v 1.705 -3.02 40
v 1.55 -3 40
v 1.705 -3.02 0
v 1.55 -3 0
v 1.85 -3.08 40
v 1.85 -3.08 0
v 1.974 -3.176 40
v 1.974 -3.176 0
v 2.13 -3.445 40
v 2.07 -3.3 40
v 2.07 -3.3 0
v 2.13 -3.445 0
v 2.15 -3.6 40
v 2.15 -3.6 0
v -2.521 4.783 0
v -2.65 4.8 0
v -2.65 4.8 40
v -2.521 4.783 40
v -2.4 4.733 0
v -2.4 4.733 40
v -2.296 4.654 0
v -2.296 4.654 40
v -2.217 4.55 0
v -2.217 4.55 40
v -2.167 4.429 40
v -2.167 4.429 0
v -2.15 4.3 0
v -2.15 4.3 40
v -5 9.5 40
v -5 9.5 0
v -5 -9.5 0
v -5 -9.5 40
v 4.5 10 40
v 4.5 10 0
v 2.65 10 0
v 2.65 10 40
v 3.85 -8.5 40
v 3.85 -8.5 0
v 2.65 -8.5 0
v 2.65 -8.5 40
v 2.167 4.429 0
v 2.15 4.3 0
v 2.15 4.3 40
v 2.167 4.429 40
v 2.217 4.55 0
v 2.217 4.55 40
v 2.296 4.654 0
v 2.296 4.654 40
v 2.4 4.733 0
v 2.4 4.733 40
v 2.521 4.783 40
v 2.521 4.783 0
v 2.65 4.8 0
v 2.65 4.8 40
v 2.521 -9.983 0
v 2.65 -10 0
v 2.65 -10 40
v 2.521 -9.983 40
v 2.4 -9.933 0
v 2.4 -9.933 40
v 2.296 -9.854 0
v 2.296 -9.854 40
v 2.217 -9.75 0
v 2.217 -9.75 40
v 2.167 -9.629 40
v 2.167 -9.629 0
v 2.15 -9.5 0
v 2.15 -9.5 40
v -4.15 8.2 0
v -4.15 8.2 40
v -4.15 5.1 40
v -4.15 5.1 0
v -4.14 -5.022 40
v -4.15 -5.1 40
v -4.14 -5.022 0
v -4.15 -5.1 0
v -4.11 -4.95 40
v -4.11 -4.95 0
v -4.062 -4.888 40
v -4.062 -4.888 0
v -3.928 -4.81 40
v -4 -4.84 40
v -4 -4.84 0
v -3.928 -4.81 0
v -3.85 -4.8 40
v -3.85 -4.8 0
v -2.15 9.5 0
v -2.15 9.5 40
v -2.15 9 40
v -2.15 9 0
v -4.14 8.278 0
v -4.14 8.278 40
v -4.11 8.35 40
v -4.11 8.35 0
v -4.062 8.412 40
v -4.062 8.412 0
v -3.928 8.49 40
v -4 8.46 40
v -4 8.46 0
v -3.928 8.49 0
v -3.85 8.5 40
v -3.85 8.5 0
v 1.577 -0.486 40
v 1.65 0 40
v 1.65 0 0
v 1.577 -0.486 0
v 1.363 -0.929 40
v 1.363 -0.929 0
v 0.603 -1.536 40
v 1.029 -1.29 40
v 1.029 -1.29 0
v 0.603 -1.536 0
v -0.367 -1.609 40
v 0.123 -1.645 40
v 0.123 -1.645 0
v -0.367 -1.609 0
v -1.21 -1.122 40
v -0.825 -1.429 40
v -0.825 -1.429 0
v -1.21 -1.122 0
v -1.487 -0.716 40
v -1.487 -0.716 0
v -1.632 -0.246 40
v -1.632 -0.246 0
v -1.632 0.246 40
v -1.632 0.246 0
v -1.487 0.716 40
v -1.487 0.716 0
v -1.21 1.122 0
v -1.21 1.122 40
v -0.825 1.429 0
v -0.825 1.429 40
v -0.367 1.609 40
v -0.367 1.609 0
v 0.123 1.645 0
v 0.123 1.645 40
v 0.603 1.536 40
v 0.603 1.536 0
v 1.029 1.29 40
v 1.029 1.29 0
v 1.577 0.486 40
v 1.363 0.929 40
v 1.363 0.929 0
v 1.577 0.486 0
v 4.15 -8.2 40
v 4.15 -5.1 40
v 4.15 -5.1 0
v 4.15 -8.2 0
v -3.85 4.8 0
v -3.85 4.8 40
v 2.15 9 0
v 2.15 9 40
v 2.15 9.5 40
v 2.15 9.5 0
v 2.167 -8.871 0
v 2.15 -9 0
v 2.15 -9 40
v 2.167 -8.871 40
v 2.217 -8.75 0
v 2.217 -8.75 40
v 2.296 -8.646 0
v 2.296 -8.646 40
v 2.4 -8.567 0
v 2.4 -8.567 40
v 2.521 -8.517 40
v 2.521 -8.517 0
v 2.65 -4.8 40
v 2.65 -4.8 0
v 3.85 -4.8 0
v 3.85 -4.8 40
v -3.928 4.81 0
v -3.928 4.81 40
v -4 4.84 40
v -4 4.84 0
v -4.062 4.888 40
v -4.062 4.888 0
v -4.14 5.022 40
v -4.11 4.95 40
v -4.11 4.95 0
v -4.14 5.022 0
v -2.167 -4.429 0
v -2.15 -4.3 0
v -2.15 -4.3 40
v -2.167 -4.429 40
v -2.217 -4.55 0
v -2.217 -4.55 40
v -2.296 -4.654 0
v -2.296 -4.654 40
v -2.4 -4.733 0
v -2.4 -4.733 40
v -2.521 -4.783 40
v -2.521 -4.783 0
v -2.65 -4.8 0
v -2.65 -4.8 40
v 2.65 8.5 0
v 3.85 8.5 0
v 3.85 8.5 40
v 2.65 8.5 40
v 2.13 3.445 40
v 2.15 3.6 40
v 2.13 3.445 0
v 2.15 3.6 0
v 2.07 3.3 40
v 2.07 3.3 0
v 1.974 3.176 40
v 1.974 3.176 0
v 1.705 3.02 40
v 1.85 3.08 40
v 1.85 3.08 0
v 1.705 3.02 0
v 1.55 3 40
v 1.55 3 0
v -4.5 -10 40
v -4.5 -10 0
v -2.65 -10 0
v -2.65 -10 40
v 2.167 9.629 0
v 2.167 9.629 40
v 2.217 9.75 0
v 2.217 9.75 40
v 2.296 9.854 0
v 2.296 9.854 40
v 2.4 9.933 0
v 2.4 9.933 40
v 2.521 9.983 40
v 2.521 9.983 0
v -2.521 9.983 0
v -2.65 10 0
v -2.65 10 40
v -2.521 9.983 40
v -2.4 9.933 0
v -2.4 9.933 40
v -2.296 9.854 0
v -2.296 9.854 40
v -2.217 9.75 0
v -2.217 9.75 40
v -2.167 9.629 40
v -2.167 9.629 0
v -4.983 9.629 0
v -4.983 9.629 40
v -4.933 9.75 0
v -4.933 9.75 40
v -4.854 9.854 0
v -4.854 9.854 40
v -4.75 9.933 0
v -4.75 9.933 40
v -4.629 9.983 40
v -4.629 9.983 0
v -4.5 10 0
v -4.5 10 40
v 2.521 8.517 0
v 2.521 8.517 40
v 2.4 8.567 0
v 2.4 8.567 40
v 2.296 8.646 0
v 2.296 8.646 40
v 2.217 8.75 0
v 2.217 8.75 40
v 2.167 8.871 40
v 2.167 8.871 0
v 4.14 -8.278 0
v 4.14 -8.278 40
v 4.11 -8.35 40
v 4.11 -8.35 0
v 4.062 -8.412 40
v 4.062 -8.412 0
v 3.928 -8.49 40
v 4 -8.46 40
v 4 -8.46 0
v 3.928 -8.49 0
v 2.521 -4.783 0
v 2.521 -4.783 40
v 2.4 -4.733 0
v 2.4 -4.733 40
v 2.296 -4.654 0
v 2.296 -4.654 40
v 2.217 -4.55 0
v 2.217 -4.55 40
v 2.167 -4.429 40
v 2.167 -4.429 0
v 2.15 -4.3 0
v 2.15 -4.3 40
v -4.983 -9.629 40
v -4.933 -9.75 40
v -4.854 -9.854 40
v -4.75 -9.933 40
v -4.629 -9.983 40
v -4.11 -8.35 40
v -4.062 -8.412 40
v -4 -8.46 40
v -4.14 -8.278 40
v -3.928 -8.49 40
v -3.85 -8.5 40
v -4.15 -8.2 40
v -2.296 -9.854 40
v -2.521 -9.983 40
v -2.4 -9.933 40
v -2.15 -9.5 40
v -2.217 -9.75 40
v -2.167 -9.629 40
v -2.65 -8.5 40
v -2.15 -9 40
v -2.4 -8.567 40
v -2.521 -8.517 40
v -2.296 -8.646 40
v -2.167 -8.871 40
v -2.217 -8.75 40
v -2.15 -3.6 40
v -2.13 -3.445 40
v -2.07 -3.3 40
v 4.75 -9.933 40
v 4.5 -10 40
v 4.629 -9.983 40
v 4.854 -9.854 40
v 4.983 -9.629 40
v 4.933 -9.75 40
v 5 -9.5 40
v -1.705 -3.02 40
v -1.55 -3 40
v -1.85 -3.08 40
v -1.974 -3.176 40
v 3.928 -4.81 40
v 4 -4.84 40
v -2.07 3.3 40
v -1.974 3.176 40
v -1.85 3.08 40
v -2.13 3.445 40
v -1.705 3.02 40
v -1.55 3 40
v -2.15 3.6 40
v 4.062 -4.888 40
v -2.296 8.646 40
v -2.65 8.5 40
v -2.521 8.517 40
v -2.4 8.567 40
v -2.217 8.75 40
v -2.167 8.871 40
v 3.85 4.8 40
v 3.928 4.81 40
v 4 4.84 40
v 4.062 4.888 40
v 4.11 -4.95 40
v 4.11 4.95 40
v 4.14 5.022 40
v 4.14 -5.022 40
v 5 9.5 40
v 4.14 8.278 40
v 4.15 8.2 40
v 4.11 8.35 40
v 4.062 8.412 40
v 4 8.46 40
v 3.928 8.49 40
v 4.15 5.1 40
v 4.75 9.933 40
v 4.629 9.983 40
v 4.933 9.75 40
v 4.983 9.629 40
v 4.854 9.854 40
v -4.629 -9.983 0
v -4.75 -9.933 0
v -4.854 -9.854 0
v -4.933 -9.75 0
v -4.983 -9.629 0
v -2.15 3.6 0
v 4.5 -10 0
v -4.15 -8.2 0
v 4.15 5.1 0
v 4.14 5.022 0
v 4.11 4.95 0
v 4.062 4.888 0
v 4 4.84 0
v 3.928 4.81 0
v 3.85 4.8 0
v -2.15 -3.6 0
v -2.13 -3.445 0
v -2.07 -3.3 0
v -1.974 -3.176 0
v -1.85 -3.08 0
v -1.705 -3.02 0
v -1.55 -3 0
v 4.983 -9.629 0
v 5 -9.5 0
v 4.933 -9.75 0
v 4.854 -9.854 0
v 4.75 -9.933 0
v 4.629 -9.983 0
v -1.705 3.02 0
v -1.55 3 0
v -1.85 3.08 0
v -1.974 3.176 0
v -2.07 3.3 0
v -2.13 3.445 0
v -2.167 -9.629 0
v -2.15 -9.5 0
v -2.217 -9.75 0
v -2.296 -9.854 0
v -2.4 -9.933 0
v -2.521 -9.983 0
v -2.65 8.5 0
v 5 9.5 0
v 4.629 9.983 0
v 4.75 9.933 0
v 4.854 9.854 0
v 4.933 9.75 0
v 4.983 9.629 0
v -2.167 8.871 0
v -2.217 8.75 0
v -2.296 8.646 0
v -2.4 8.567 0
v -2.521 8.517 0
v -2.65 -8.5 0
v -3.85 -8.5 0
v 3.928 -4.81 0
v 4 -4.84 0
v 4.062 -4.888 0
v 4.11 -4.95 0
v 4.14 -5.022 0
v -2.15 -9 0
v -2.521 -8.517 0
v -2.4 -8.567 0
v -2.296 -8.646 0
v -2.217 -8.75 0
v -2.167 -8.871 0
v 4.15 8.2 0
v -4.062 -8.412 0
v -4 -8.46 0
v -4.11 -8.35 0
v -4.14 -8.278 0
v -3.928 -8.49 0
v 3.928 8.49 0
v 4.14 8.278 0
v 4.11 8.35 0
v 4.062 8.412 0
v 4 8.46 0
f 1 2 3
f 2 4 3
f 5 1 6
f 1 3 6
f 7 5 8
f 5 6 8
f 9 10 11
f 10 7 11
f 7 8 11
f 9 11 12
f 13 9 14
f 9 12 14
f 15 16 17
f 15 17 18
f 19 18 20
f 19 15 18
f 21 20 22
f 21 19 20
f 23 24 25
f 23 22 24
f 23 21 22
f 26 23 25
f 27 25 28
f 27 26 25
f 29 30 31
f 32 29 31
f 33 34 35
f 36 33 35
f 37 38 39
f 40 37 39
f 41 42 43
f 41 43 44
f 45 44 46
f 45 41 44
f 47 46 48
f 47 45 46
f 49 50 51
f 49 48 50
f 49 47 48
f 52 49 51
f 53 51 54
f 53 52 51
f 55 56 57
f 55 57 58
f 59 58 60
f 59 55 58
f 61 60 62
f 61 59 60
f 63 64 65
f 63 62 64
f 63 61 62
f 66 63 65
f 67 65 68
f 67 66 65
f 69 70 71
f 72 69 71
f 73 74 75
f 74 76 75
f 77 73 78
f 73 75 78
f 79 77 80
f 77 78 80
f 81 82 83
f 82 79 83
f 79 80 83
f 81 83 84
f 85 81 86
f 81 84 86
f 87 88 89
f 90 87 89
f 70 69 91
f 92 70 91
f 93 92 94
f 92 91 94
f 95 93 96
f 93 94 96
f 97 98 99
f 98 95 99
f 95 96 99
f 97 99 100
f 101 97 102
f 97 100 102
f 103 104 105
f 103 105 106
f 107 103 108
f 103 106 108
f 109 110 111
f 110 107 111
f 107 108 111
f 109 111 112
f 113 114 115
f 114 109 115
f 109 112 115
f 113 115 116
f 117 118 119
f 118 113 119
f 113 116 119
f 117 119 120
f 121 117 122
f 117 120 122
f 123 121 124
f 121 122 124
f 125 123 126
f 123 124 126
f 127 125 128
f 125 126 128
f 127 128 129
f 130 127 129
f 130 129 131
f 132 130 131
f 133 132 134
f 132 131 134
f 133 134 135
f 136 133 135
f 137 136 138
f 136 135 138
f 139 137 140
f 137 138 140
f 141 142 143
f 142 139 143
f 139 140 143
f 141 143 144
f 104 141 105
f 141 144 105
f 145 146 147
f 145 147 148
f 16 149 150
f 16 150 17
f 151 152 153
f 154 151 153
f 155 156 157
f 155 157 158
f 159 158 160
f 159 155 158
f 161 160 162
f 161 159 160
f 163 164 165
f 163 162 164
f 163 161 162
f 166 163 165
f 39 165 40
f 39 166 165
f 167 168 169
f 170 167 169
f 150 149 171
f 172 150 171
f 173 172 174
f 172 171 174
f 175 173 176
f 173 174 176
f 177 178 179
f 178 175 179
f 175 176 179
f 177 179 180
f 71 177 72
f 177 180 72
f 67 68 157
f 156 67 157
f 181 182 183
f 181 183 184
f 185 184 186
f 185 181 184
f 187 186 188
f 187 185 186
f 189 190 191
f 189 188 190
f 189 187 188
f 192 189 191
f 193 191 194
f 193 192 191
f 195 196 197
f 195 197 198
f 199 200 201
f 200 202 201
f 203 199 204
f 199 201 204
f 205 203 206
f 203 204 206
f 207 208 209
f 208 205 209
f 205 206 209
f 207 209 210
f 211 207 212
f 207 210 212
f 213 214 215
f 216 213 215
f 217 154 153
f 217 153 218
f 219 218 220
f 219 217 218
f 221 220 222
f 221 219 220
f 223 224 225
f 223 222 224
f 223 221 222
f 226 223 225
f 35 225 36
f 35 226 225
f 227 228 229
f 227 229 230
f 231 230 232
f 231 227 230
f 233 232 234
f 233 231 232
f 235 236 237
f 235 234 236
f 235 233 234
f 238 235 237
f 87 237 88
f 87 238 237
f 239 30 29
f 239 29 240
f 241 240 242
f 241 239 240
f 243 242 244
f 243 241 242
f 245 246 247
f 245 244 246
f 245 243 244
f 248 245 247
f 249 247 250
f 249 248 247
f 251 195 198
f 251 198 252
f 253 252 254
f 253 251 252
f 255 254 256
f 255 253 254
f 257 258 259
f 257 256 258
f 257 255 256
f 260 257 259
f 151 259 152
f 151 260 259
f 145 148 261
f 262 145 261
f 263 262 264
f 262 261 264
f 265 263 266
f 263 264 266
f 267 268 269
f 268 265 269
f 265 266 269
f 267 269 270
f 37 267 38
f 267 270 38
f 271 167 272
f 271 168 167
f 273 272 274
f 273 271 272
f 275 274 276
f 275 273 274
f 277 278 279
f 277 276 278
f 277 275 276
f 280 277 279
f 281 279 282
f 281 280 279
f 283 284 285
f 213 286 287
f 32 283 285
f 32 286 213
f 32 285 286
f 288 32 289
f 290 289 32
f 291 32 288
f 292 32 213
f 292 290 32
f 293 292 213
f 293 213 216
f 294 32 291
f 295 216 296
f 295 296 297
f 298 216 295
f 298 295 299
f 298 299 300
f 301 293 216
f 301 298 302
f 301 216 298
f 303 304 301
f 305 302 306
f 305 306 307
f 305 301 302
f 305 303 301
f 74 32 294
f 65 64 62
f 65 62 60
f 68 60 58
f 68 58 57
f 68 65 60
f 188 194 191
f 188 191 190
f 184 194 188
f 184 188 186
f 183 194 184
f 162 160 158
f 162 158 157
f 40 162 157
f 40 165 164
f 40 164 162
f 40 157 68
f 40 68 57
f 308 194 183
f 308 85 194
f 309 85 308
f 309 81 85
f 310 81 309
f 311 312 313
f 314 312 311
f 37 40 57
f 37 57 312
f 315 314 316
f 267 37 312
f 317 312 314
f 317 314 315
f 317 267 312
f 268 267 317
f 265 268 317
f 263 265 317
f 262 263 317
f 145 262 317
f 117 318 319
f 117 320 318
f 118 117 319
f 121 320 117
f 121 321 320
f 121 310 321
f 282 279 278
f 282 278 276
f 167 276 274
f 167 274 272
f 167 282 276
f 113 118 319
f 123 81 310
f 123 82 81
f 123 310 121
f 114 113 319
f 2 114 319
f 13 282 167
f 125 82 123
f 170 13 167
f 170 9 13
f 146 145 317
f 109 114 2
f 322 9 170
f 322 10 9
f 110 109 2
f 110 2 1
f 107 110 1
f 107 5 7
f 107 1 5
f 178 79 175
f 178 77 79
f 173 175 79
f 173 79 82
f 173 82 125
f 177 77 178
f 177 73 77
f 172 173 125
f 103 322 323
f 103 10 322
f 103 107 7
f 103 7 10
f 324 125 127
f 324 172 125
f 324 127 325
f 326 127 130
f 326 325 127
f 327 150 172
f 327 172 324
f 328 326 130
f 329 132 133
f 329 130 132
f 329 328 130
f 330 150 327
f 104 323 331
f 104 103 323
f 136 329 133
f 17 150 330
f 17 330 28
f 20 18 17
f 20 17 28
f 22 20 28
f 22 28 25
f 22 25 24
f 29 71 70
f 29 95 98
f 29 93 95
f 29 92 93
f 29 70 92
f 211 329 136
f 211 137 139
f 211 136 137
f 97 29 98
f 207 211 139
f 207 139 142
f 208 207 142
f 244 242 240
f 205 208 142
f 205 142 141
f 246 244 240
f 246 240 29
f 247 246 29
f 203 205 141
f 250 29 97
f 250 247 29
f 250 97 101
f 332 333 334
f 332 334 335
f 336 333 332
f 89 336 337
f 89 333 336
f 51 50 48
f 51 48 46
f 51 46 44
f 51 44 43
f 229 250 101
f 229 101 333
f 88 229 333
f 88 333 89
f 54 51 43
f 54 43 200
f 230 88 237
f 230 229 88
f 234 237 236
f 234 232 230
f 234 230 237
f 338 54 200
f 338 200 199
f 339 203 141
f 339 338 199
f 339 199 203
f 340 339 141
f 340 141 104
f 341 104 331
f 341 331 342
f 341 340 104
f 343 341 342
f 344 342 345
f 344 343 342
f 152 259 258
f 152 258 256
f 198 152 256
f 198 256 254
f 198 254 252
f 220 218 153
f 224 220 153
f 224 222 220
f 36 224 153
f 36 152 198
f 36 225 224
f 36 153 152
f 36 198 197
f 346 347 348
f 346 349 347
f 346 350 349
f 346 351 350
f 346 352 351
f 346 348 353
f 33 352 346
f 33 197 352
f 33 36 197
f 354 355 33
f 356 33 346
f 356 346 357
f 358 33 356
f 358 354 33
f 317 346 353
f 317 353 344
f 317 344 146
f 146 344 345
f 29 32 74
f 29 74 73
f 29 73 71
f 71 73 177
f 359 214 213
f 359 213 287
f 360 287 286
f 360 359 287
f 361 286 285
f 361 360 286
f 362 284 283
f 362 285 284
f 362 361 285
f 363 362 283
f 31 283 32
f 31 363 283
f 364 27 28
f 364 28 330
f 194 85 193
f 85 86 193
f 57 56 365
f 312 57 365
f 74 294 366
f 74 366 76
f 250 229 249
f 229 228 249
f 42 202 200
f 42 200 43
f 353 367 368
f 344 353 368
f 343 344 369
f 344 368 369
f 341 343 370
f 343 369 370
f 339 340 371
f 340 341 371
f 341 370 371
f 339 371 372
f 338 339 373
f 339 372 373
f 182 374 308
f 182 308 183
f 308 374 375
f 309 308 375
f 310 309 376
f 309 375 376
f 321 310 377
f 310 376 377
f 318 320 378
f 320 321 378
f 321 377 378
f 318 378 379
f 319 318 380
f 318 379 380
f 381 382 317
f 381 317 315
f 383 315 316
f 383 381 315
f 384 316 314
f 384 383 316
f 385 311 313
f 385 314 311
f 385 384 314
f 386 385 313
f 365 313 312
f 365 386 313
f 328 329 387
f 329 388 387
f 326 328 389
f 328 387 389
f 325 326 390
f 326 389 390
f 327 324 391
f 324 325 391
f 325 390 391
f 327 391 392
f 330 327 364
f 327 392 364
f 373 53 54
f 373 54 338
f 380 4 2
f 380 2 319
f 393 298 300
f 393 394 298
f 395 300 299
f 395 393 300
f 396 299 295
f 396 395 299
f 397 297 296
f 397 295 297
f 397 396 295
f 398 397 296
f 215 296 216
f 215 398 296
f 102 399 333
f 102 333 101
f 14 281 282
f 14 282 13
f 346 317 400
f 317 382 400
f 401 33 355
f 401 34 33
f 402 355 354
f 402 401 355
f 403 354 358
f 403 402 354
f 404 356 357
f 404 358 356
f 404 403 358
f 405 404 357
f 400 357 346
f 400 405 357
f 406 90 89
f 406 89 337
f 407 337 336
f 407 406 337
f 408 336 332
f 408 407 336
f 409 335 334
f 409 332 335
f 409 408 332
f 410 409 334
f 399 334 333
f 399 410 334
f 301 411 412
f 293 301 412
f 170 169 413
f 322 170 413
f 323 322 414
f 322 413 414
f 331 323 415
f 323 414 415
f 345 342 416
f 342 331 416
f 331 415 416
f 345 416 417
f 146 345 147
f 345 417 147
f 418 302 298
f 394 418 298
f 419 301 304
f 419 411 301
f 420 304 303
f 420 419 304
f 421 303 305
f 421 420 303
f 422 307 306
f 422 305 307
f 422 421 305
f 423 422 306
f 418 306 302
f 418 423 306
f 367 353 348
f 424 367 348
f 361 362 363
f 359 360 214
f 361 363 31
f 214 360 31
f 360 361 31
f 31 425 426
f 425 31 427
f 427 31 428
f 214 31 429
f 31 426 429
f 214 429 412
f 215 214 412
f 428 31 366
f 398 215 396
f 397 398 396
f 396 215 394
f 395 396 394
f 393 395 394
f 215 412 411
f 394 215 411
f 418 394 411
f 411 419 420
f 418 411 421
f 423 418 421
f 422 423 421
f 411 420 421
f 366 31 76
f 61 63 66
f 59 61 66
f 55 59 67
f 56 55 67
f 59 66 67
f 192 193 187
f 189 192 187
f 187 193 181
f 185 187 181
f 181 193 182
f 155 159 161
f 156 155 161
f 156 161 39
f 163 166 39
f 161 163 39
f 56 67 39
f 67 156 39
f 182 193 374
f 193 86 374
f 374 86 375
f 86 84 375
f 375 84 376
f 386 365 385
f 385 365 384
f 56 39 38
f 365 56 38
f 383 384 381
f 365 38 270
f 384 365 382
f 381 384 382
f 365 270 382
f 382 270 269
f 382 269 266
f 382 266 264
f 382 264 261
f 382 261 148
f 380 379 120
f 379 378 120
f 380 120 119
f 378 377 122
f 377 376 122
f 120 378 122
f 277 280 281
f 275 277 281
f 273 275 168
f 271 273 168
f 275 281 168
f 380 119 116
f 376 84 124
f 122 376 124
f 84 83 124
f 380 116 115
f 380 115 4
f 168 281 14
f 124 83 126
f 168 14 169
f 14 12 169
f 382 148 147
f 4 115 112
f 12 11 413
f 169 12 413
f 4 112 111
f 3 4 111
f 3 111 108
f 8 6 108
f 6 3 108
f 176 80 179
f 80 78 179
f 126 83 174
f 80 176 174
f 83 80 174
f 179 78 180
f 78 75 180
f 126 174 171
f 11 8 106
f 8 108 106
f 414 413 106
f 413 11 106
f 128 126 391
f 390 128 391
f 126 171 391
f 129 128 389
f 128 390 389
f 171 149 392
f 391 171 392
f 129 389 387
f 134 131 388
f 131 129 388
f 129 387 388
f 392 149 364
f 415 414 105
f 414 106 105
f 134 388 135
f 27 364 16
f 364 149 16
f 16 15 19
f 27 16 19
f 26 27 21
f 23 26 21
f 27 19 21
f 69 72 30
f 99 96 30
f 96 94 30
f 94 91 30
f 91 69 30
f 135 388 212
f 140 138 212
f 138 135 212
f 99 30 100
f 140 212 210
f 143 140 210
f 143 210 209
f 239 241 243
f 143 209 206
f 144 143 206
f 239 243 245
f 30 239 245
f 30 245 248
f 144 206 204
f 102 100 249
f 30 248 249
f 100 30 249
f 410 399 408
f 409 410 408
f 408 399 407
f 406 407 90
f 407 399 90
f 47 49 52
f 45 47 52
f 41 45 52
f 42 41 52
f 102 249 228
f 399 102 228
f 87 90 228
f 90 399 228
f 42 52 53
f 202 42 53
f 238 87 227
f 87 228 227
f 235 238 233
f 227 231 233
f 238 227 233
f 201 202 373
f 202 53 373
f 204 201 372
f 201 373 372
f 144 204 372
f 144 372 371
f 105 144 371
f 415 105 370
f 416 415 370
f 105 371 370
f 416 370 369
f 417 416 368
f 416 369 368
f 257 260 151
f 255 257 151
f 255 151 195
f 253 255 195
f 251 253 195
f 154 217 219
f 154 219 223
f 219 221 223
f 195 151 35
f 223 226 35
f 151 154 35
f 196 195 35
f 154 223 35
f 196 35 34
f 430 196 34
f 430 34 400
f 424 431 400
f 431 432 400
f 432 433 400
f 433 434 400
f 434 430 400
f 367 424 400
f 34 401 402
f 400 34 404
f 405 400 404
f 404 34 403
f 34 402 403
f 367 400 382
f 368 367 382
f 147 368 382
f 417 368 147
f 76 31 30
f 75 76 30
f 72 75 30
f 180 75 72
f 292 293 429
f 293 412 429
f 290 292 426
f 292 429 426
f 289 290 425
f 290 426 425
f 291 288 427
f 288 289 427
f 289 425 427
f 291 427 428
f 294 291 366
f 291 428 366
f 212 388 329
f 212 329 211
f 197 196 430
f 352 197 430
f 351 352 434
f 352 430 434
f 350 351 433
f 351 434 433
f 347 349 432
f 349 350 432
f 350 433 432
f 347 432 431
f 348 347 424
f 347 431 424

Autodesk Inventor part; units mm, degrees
ref_plane "YZ Plane" through (0, 0, 0) normal (1, 0, 0) x (0, 1, 0)
ref_plane "XZ Plane" through (0, 0, 0) normal (0, 1, 0) x (-1, 0, 0)
ref_plane "XY Plane" through (0, 0, 0) normal (0, 0, 1) x (1, 0, 0)
sketch "BaseI" plane through (0, 0, 0) normal (0, 0, 1) x (1, 0, 0)
  line L0 (-4.5, -10) -> (-2.65, -10)
  line L1 (5, -9.5) -> (5, 9.5)
  line L2 (4.5, 10) -> (2.65, 10)
  line L3 (-5, 9.5) -> (-5, -9.5)
  line L4 (-5, -10) -> (5, 10) construction
  line L5 (5, -10) -> (-5, 10) construction
  line L6 (3.85, 8.5) -> (2.65, 8.5)
  line L7 (-4.15, 8.2) -> (-4.15, 5.1)
  line L8 (-3.85, 4.8) -> (-2.65, 4.8)
  line L9 (4.15, 5.1) -> (4.15, 8.2)
  line L10 (4.15, 8.5) -> (-4.15, 4.8) construction
  line L11 (-4.15, 8.5) -> (4.15, 4.8) construction
  line L12 (-1.55, 3) -> (1.55, 3)
  line L13 (2.15, 3.6) -> (2.15, 4.3)
  line L14 (-2.15, 9.5) -> (-2.15, 9)
  line L15 (-2.15, 3) -> (2.15, 10) construction
  line L16 (2.15, 3) -> (-2.15, 10) construction
  line L17 (3.85, -8.5) -> (2.65, -8.5)
  line L18 (-4.15, -8.2) -> (-4.15, -5.1)
  line L19 (-3.85, -4.8) -> (-2.65, -4.8)
  line L20 (4.15, -5.1) -> (4.15, -8.2)
  line L21 (4.15, -8.5) -> (-4.15, -4.8) construction
  line L22 (-4.15, -8.5) -> (4.15, -4.8) construction
  line L23 (1.55, -3) -> (-1.55, -3)
  line L24 (-2.15, -3.6) -> (-2.15, -4.3)
  line L25 (2.15, -9.5) -> (2.15, -9)
  line L26 (2.15, -3) -> (-2.15, -10) construction
  line L27 (-2.15, -3) -> (2.15, -10) construction
  arc A0 (-4.5, 10) -> (-5, 9.5) centre (-4.5, 9.5) ccw
  arc A1 (5, 9.5) -> (4.5, 10) centre (4.5, 9.5) ccw
  arc A2 (4.5, -10) -> (5, -9.5) centre (4.5, -9.5) ccw
  arc A3 (-5, -9.5) -> (-4.5, -10) centre (-4.5, -9.5) ccw
  line L28 (-2.65, 10) -> (-4.5, 10)
  line L29 (2.65, -10) -> (4.5, -10)
  arc A4 (-3.85, 8.5) -> (-4.15, 8.2) centre (-3.85, 8.2) ccw
  arc A5 (-4.15, 5.1) -> (-3.85, 4.8) centre (-3.85, 5.1) ccw
  arc A6 (4.15, 8.2) -> (3.85, 8.5) centre (3.85, 8.2) ccw
  arc A7 (3.85, 4.8) -> (4.15, 5.1) centre (3.85, 5.1) ccw
  arc A8 (-3.85, -4.8) -> (-4.15, -5.1) centre (-3.85, -5.1) ccw
  arc A9 (-4.15, -8.2) -> (-3.85, -8.5) centre (-3.85, -8.2) ccw
  arc A10 (4.15, -5.1) -> (3.85, -4.8) centre (3.85, -5.1) ccw
  arc A11 (3.85, -8.5) -> (4.15, -8.2) centre (3.85, -8.2) ccw
  arc A12 (-2.15, 3.6) -> (-1.55, 3) centre (-1.55, 3.6) ccw
  arc A13 (1.55, 3) -> (2.15, 3.6) centre (1.55, 3.6) ccw
  arc A14 (-1.55, -3) -> (-2.15, -3.6) centre (-1.55, -3.6) ccw
  arc A15 (2.15, -3.6) -> (1.55, -3) centre (1.55, -3.6) ccw
  arc A16 (-2.15, 9.5) -> (-2.65, 10) centre (-2.65, 9.5) ccw
  arc A17 (2.65, 10) -> (2.15, 9.5) centre (2.65, 9.5) ccw
  line L30 (-2.65, 8.5) -> (-3.85, 8.5)
  line L31 (2.65, 4.8) -> (3.85, 4.8)
  line L32 (2.15, 9) -> (2.15, 9.5)
  line L33 (-2.15, 4.3) -> (-2.15, 3.6)
  line L34 (2.15, -4.3) -> (2.15, -3.6)
  line L35 (-2.15, -9) -> (-2.15, -9.5)
  line L36 (2.65, -4.8) -> (3.85, -4.8)
  line L37 (-2.65, -8.5) -> (-3.85, -8.5)
  arc A18 (-2.15, 4.3) -> (-2.65, 4.8) centre (-2.65, 4.3) ccw
  arc A19 (2.65, 4.8) -> (2.15, 4.3) centre (2.65, 4.3) ccw
  arc A20 (2.15, 9) -> (2.65, 8.5) centre (2.65, 9) ccw
  arc A21 (-2.65, 8.5) -> (-2.15, 9) centre (-2.65, 9) ccw
  arc A22 (-2.65, -4.8) -> (-2.15, -4.3) centre (-2.65, -4.3) ccw
  arc A23 (2.15, -4.3) -> (2.65, -4.8) centre (2.65, -4.3) ccw
  arc A24 (2.65, -8.5) -> (2.15, -9) centre (2.65, -9) ccw
  arc A25 (-2.15, -9) -> (-2.65, -8.5) centre (-2.65, -9) ccw
  arc A26 (-2.65, -10) -> (-2.15, -9.5) centre (-2.65, -9.5) ccw
  arc A27 (2.15, -9.5) -> (2.65, -10) centre (2.65, -9.5) ccw
  circle A28 centre (0, 0) radius 1.65
  point P0 (0, 6.65)
  point P1 (0, 6.5)
  point P2 (0, -6.65)
  point P3 (0, -6.5)
  point P4 (0, 6.5)
  point P5 (0, 10)
  point P6 (0, -6.5)
  point P7 (0, -10)
  point P8 (0, 6.65)
  point P9 (0, 10)
  point P10 (0, 6.65)
  point P11 (0, -6.65)
  point P12 (0, -10)
  point P13 (0, -6.5)
  point P14 (0, -6.65)
  point P15 (0, 6.5)
  dimension "d0" = 10
  dimension "d1" = 20
  dimension "d2" = 7
  dimension "d3" = 4.3
  dimension "d4" = 7
  dimension "d5" = 4.3
  dimension "d6" = 8.3
  dimension "d7" = 8.3
  dimension "d8" = 3.7
  dimension "d9" = 3.7
  dimension "d10" = 1.5
  dimension "d11" = 1.5
  dimension "d12" = 0.5
  dimension "d13" = 0.3
  dimension "d14" = 0.6
  dimension "d15" = 0.5
  dimension "d16" = 0.5
  dimension "d17" = 3.3
extrude "押し出し1" add sketch "BaseI" along normal blind 40
properties part number "I330" material "アルミニウム 6061"
